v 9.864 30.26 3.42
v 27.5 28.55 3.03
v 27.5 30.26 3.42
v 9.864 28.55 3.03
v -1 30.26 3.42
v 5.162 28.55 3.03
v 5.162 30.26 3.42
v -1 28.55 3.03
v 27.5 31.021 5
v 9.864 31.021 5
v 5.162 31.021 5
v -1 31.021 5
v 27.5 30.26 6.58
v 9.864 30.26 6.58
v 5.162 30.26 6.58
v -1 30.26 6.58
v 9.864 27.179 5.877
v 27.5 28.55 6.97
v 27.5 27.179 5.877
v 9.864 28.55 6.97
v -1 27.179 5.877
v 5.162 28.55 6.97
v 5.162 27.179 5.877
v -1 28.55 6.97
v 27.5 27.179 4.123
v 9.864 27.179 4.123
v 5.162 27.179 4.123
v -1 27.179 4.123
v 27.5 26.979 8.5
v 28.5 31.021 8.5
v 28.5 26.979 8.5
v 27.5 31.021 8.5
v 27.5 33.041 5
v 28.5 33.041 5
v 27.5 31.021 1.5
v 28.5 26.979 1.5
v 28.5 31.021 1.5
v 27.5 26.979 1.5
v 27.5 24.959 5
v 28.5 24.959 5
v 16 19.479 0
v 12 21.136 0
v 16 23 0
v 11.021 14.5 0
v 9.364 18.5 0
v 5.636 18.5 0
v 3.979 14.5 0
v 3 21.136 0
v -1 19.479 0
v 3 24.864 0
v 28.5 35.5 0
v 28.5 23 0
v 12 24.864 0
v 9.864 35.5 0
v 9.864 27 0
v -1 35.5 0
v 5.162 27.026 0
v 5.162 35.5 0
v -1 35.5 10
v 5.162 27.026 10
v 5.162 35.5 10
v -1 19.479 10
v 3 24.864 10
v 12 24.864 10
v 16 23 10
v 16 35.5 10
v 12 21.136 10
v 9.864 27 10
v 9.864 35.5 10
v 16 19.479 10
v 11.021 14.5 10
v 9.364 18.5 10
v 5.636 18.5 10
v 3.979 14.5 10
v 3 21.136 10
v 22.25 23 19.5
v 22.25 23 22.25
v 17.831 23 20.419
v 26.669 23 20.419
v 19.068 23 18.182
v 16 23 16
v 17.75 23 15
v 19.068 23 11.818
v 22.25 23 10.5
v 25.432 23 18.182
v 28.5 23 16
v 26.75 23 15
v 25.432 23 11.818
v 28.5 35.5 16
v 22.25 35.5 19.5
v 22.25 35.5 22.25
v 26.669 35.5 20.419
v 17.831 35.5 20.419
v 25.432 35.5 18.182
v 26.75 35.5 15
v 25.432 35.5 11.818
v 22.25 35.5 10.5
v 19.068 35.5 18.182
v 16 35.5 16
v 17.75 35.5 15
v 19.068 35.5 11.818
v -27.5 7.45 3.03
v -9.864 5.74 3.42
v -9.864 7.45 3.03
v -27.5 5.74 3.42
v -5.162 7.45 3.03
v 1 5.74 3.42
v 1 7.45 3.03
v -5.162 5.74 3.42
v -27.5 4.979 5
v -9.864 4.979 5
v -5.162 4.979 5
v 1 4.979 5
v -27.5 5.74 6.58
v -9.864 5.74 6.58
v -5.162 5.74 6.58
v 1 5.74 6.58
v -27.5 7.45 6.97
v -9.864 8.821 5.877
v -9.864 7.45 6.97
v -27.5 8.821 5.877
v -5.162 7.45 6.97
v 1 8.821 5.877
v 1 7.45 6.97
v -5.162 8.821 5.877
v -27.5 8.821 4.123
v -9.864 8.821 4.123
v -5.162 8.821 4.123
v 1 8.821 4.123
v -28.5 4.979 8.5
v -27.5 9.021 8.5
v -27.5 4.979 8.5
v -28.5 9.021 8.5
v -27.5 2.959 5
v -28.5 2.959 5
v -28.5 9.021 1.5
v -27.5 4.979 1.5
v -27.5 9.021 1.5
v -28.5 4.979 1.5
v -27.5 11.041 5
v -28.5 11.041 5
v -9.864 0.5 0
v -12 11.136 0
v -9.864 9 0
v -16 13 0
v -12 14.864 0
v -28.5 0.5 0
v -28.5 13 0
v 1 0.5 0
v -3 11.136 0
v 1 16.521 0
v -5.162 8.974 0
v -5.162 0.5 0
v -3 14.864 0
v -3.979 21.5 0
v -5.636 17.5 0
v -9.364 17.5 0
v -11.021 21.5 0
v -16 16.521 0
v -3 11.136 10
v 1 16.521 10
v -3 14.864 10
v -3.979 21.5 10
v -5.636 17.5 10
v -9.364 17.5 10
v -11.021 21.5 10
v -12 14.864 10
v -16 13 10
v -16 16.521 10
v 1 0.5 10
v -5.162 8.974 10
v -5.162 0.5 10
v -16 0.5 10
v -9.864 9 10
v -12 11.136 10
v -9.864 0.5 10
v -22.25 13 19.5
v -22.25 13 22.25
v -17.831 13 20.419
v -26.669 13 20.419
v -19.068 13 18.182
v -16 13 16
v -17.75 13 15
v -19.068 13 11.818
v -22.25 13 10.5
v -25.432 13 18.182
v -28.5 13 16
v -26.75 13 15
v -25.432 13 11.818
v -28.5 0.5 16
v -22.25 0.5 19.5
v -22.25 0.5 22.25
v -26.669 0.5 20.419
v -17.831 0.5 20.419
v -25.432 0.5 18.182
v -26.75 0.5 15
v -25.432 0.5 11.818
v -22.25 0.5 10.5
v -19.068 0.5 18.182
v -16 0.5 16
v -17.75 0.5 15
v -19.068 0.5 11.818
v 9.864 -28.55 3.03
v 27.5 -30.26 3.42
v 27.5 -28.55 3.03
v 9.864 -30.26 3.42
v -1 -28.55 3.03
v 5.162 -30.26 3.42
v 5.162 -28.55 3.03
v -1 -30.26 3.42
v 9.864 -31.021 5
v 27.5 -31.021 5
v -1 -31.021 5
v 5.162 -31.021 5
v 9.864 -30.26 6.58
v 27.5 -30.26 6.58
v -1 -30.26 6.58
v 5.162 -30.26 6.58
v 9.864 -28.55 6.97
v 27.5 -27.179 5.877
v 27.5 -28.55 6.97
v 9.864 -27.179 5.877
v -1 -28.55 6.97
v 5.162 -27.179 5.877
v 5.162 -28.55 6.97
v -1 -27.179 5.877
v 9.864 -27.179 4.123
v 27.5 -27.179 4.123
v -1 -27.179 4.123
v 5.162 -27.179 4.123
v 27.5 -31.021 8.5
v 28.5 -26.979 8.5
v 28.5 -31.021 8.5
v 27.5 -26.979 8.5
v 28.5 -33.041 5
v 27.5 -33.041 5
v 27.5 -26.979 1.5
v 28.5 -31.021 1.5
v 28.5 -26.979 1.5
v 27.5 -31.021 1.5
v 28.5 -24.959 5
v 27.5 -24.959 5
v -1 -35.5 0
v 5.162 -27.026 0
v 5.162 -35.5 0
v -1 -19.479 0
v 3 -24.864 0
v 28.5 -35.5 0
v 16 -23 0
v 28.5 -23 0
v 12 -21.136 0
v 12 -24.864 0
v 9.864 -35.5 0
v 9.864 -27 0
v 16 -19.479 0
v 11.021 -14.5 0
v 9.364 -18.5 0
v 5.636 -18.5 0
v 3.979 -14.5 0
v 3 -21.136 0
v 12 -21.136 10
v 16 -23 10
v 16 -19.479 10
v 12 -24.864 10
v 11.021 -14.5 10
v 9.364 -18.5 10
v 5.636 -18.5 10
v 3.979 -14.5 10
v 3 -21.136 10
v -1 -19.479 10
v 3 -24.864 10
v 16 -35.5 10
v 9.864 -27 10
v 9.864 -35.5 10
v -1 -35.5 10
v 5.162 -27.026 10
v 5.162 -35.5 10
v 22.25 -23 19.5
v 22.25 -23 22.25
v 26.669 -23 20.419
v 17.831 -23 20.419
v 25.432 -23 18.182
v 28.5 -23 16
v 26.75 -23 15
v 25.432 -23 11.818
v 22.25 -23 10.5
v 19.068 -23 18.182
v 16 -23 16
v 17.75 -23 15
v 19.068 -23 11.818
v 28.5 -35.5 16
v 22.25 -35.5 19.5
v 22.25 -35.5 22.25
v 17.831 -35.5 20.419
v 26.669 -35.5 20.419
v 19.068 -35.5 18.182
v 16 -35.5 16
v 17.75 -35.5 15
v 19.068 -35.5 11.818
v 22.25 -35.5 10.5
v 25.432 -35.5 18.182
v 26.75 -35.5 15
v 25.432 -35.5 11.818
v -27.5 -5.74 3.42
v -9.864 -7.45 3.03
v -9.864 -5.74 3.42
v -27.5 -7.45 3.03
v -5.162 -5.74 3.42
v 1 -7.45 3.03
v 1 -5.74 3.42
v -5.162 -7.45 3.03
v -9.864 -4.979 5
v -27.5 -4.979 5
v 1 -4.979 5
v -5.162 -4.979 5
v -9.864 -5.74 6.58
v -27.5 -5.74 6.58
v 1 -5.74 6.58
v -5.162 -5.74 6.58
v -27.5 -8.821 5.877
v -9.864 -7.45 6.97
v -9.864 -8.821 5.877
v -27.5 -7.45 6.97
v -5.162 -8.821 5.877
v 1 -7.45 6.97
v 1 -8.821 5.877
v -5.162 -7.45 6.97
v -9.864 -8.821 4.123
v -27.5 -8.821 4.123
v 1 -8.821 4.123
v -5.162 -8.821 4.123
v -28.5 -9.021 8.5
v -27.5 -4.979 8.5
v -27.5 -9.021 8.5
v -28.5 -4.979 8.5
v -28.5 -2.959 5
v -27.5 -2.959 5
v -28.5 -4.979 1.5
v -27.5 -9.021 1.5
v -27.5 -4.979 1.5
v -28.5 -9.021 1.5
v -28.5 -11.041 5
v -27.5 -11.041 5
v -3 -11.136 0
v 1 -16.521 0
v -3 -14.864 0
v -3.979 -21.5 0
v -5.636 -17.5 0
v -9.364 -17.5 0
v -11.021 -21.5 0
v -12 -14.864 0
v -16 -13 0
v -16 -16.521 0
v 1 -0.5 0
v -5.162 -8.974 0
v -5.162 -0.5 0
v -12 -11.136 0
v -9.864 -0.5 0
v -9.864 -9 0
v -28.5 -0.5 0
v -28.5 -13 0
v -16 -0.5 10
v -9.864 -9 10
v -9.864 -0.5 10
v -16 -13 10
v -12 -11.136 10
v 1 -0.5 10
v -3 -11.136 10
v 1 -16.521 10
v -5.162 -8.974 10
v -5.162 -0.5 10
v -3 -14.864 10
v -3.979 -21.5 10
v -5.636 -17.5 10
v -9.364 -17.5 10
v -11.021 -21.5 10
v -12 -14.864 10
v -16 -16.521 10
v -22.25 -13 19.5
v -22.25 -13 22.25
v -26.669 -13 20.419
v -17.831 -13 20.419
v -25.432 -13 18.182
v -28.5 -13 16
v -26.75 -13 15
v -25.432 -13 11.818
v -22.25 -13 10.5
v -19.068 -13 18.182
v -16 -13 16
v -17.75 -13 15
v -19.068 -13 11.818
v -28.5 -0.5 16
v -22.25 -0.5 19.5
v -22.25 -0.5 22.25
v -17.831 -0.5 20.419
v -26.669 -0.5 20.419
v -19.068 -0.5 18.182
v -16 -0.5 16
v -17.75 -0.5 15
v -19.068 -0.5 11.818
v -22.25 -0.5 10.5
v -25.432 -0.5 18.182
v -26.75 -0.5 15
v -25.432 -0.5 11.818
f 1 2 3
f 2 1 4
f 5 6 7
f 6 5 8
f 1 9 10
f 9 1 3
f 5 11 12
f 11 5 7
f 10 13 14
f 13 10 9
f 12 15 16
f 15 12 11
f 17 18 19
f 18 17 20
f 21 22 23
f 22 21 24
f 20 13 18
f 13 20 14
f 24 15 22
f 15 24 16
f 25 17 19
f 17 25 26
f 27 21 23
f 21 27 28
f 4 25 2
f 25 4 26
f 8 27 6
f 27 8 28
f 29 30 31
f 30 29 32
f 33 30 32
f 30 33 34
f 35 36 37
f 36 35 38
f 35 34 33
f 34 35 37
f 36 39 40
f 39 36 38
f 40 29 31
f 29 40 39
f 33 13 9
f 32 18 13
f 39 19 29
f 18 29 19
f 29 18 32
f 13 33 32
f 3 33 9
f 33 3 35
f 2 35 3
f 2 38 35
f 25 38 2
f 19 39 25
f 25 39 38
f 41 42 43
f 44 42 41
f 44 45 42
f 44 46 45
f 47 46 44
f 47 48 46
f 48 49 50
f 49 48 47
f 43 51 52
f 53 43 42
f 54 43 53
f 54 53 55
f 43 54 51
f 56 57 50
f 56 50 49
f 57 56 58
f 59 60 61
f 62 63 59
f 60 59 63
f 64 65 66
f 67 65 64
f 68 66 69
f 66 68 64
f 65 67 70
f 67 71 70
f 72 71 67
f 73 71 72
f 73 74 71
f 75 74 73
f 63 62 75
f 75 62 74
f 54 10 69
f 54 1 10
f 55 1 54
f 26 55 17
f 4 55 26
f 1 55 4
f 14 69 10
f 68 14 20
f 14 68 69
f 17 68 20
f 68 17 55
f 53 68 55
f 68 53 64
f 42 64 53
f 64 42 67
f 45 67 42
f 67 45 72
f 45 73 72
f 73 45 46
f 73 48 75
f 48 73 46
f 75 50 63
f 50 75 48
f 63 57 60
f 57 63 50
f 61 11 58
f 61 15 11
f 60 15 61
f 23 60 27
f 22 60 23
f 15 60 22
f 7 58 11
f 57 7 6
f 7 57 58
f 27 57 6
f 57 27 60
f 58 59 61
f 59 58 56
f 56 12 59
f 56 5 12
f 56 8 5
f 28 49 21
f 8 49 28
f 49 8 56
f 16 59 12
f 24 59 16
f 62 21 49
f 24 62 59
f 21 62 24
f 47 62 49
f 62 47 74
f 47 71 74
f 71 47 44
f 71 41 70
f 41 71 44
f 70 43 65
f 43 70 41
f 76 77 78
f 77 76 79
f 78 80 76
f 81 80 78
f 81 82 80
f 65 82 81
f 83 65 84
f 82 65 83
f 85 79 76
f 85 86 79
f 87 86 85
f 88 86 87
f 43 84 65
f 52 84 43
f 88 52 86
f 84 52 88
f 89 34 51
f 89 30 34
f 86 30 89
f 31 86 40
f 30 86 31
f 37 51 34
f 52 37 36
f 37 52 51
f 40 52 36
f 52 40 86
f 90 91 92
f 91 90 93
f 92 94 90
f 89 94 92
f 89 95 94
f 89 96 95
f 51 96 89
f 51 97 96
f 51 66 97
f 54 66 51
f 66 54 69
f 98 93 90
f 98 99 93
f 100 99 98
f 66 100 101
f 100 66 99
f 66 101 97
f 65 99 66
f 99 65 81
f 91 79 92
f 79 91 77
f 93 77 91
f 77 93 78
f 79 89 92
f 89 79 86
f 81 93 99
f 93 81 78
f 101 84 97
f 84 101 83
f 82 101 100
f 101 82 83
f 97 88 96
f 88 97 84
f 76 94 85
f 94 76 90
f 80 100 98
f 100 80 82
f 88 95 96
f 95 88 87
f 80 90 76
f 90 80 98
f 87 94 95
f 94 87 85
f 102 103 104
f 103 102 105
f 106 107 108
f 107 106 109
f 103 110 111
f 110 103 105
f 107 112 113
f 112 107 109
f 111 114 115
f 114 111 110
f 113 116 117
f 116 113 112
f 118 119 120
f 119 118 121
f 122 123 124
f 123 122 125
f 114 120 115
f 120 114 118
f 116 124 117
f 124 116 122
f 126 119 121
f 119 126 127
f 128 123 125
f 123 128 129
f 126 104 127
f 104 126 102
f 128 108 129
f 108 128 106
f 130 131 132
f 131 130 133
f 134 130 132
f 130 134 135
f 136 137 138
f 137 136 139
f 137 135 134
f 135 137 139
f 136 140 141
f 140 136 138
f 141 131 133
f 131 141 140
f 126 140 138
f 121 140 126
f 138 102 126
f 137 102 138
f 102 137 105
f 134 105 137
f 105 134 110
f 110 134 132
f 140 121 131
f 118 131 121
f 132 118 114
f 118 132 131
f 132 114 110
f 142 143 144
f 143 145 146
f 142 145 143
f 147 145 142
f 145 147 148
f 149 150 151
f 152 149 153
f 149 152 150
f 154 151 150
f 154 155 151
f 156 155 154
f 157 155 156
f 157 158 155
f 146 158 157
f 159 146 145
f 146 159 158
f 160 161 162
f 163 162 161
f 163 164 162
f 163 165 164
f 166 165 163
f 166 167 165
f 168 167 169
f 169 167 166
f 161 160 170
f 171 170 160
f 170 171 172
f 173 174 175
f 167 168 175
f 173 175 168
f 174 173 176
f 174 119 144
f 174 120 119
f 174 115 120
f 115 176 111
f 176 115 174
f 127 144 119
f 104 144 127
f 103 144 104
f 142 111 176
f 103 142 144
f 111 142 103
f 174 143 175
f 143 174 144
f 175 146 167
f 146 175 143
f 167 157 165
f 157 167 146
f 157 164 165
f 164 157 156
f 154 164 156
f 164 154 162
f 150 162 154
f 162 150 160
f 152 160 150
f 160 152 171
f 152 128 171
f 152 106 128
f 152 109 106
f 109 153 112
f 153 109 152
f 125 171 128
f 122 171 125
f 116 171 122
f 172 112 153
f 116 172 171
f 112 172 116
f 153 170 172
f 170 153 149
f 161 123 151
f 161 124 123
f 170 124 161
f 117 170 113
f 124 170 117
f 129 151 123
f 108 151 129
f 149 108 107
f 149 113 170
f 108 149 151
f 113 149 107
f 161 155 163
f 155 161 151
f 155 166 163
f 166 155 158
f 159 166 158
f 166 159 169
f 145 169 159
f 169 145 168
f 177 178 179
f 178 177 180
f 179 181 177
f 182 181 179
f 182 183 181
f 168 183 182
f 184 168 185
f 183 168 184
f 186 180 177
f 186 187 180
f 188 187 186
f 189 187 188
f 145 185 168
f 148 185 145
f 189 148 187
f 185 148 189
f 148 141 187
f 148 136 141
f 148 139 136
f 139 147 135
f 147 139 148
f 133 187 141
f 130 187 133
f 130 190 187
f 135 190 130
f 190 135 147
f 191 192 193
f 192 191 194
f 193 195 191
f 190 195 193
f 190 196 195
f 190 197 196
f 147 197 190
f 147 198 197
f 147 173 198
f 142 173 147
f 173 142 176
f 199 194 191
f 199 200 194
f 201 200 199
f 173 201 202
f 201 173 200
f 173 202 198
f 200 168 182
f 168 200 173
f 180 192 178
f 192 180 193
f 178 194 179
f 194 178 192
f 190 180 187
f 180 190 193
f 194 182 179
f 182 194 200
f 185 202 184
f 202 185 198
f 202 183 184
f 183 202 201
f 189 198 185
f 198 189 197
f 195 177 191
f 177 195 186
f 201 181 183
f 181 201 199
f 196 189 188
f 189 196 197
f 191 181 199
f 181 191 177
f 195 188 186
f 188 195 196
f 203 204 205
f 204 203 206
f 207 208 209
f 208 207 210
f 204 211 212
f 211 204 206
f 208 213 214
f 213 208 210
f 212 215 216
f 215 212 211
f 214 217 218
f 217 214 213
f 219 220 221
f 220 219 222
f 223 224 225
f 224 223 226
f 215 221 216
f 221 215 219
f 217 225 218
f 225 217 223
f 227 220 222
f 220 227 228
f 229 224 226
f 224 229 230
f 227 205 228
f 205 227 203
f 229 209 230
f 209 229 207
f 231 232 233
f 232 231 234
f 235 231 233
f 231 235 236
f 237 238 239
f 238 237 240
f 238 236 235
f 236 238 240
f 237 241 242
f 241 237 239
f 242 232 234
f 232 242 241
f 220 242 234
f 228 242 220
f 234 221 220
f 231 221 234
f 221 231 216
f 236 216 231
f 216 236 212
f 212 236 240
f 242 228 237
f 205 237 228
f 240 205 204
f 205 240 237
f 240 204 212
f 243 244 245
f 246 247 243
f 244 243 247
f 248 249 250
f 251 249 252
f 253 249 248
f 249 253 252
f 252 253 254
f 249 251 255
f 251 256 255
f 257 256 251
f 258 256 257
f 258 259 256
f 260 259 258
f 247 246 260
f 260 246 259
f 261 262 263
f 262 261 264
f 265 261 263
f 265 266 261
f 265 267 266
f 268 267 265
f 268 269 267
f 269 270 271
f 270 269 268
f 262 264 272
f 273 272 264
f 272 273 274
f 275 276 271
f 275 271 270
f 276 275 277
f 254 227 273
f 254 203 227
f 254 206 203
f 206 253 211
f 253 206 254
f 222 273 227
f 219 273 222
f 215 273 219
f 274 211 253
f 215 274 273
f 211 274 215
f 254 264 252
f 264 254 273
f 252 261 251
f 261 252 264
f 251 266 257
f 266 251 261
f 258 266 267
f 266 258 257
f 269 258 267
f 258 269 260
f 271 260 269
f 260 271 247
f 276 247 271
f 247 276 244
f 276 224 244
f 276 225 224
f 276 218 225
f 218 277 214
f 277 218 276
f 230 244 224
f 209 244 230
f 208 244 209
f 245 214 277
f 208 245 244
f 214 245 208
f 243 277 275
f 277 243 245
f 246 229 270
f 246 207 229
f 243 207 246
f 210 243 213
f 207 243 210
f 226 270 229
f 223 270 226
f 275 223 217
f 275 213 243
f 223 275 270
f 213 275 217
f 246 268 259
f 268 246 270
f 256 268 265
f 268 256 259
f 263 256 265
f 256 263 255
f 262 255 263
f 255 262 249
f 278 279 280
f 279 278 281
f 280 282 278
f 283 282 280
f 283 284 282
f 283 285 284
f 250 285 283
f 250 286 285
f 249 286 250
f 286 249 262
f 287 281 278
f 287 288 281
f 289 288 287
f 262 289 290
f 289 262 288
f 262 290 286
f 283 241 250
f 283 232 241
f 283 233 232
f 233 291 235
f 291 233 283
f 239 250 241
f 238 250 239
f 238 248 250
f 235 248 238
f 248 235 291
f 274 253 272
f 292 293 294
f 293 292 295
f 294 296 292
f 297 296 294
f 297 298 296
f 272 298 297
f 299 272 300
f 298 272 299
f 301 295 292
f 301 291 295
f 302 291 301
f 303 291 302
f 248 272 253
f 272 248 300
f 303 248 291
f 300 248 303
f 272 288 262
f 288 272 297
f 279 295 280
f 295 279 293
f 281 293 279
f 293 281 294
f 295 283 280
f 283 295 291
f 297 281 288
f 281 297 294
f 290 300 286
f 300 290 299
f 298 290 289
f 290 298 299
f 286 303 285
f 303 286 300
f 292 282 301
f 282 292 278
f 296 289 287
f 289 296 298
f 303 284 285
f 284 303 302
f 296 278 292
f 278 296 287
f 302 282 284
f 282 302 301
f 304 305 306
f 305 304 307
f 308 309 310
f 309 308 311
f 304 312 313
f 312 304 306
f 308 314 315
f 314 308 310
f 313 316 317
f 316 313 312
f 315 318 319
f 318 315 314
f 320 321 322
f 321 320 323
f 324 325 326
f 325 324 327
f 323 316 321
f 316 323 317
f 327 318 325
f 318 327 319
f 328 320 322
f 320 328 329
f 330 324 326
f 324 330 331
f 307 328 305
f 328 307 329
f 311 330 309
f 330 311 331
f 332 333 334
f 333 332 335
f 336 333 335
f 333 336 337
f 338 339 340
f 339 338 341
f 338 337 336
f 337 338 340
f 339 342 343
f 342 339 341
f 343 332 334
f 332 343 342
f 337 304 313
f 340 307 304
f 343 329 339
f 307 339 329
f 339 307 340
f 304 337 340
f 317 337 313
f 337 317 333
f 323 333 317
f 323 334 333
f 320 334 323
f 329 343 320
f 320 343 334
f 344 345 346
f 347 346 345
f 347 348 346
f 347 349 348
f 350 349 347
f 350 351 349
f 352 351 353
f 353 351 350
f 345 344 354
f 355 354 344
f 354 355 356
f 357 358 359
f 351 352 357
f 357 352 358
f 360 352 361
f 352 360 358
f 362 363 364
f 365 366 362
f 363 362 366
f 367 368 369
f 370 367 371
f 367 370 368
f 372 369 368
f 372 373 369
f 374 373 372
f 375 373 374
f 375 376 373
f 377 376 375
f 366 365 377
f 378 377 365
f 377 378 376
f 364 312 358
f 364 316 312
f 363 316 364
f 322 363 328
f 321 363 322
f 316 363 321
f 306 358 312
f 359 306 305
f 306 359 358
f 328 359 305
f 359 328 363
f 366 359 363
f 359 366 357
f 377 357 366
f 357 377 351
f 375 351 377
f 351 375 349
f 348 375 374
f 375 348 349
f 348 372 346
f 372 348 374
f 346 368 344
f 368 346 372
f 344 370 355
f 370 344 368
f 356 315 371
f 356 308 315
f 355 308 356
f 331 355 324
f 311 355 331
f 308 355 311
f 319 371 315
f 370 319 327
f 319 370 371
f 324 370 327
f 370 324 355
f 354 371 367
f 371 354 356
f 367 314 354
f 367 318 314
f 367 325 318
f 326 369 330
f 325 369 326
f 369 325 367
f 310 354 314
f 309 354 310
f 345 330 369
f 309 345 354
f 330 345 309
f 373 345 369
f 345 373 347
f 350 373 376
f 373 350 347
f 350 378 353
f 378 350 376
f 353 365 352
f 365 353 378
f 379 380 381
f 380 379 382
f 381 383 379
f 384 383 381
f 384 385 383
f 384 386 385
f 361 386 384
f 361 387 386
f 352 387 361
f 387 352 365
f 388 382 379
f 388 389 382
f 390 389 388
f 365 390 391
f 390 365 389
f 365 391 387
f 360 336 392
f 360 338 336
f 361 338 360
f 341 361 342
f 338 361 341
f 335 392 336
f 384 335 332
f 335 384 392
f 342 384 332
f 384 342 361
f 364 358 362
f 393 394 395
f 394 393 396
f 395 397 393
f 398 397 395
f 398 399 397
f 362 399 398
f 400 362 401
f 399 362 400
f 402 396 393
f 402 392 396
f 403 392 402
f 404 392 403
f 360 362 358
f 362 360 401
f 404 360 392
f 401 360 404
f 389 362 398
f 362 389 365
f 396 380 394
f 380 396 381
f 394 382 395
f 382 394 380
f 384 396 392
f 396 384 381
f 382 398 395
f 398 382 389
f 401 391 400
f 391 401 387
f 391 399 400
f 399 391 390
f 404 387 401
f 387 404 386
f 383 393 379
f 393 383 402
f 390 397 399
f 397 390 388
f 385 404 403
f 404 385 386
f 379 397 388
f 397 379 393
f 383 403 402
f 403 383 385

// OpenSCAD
// file: settings.scad
rod_size = 9;
rod_nut_size = 15.5; //12 for M6, 15 for M8
bearing_size = 15.7; //12.5 for LM6UU, 15.5 for LM8UU,LM8SUU
bearing_length = 25.5; //19.5 for LM6UU, 17.5 for LM8SUU, 24.5 for LM8UU
yz_motor_distance = 25;
motor_screw_spacing = 31; //26 for NEMA14, 31 for NEMA17
motor_casing = 45; //38 for NEMA14, 45 for NEMA17
end_height = 55; //measure the height of your motor casing and add 4mm. Suggestion: 40 for NEMA14, 55 for NEMA17
bed_mount_height = 16;
//x_rod_spacing = motor_screw_spacing + 3 + rod_size;
x_rod_spacing = 30;
x_carriage_width = 70;
carriage_extruder_offset = 5;
pulley_size = 20;
idler_pulley_width = 10;
gusset_size = 15;
m3_size = 3.5;
m3_nut_size = 7;
// m3 nut height is because tristan doesn't know the height of an m3 nut, it is not implemented everywhere, just on the z stop in base_end_2off.scad
m3_nut_height = 3;
m4_size = 4.5;
motor_shaft_size = 5.5;

z_stop_screw_spacing = 20;
// these may be super unneeded, in which case we can easily do a search and replace. But they may be really useful for prototyping/whatever.
z_stop_mount_x_buffer = 2;
z_stop_mount_y_buffer = 2;
z_stop_mount_z_buffer = 2;
z_stop_side_holes = true;
z_stop_bottom_holes = false;

z_stop_arm_actuator_width = 2;
z_stop_arm_actuator_depth = 8;
z_stop_arm_actuator_height = 60;
z_stop_depth = -30;//this is for the optical endstop, this is the width from where it is mounted to where it is clear for the arm to go through.
z_stop_x_adjust=0;

// printer properties. These settings affect major changes in the structure of the printer.
use_rod_for_x_ends = true; // This makes the holes that clamp the x ends the size for rod. This is good when mounting the optical endstop arm, because it is hard to find bolts long enough to go through the end and the endstop arm. (metric ones at least)

// meta vars, these are set by other vars for ease of reference.
z_mount_width = m3_nut_size+z_stop_screw_spacing+(z_stop_mount_x_buffer*2);
base_z_rod_x_offset = yz_motor_distance / 2 - rod_size;
distance_between_x_end_cylinders = motor_casing / 2 + rod_size;
z_stop_x_offset = base_z_rod_x_offset + distance_between_x_end_cylinders - (z_mount_width/2) + z_stop_x_adjust;
x_end_cylinder_radius = bearing_size / 2 + 3;
x_end_front_face_y_offset = (bearing_size / 2 + 3)/2;//In case it's non obvious, this is for getting the amount the x end cylinders extend past the front face.
x_end_cylinder_protrution_depth = x_end_cylinder_radius - x_end_front_face_y_offset;
z_stop_arm_depth = z_stop_arm_actuator_depth + z_stop_depth + m3_nut_height+(z_stop_mount_y_buffer*2)+(motor_casing + (rod_size*4))/2 - x_end_front_face_y_offset;
z_stop_arm_height = z_stop_arm_actuator_height + x_rod_spacing + 8 + rod_size;
z_stop_arm_x_support_depth = (z_stop_arm_depth - x_end_cylinder_protrution_depth) / 3;

// ratio for converting diameter to apothem
da6 = 1 / cos(180 / 6) / 2;
da8 = 1 / cos(180 / 8) / 2;
// main file
include <settings.scad>;

!for(b = [0:1]) mirror([0, b, 0]) for(a = [-1,1]) translate([a * -7.5, 18 - 5 * a, 0]) rotate(180 + 90 * a) bed_mount();


module bed_mount(){ 
    difference() {
	linear_extrude(height = 10, convexity = 5) difference() {
		union() {
			rotate(180 / 8) circle((rod_size + 8) * da8, $fn = 8);
			translate([0, -rod_size / 2 - 4-12.5, 0]) square([rod_size / 2 + 8, max(rod_size + 20.5, rod_size / 2 + 4 )]);
		}
		rotate(180 / 8) circle(rod_size * da8, $fn = 8);
		translate([0, -0.5-rod_size / (1 + sqrt(2)) / 2, 0]) square([rod_size + 10, rod_size / (0.5 + sqrt(2))]);
	}
	translate([rod_size / 2 + 1.5, -rod_size / 2 - 19.5, 5]) rotate([-90, 0, 0]) {
		cylinder(r = m3_size * da6, h = max(rod_size + 24, rod_size / 2 + 7 + bed_mount_height, $fn = 6));
		cylinder(r = m3_nut_size * da6, h = 4, $fn = 6);
	}
}

//##THIS IS PROBABLY THE PART THAT'S BREAKING
translate([0,-29,0])difference(){
    union(){
        translate([0,8,9])cube([12.5,12.5,7]);
        translate([12.5,14.25,16])rotate([-90,0,90])cylinder(r=12.5/2,h=12.5,$fn=8);
    }
    translate([15,14.25,15])rotate([-90,0,90])cylinder(r=rod_size/2,h=50,$fn=8);
}
}
